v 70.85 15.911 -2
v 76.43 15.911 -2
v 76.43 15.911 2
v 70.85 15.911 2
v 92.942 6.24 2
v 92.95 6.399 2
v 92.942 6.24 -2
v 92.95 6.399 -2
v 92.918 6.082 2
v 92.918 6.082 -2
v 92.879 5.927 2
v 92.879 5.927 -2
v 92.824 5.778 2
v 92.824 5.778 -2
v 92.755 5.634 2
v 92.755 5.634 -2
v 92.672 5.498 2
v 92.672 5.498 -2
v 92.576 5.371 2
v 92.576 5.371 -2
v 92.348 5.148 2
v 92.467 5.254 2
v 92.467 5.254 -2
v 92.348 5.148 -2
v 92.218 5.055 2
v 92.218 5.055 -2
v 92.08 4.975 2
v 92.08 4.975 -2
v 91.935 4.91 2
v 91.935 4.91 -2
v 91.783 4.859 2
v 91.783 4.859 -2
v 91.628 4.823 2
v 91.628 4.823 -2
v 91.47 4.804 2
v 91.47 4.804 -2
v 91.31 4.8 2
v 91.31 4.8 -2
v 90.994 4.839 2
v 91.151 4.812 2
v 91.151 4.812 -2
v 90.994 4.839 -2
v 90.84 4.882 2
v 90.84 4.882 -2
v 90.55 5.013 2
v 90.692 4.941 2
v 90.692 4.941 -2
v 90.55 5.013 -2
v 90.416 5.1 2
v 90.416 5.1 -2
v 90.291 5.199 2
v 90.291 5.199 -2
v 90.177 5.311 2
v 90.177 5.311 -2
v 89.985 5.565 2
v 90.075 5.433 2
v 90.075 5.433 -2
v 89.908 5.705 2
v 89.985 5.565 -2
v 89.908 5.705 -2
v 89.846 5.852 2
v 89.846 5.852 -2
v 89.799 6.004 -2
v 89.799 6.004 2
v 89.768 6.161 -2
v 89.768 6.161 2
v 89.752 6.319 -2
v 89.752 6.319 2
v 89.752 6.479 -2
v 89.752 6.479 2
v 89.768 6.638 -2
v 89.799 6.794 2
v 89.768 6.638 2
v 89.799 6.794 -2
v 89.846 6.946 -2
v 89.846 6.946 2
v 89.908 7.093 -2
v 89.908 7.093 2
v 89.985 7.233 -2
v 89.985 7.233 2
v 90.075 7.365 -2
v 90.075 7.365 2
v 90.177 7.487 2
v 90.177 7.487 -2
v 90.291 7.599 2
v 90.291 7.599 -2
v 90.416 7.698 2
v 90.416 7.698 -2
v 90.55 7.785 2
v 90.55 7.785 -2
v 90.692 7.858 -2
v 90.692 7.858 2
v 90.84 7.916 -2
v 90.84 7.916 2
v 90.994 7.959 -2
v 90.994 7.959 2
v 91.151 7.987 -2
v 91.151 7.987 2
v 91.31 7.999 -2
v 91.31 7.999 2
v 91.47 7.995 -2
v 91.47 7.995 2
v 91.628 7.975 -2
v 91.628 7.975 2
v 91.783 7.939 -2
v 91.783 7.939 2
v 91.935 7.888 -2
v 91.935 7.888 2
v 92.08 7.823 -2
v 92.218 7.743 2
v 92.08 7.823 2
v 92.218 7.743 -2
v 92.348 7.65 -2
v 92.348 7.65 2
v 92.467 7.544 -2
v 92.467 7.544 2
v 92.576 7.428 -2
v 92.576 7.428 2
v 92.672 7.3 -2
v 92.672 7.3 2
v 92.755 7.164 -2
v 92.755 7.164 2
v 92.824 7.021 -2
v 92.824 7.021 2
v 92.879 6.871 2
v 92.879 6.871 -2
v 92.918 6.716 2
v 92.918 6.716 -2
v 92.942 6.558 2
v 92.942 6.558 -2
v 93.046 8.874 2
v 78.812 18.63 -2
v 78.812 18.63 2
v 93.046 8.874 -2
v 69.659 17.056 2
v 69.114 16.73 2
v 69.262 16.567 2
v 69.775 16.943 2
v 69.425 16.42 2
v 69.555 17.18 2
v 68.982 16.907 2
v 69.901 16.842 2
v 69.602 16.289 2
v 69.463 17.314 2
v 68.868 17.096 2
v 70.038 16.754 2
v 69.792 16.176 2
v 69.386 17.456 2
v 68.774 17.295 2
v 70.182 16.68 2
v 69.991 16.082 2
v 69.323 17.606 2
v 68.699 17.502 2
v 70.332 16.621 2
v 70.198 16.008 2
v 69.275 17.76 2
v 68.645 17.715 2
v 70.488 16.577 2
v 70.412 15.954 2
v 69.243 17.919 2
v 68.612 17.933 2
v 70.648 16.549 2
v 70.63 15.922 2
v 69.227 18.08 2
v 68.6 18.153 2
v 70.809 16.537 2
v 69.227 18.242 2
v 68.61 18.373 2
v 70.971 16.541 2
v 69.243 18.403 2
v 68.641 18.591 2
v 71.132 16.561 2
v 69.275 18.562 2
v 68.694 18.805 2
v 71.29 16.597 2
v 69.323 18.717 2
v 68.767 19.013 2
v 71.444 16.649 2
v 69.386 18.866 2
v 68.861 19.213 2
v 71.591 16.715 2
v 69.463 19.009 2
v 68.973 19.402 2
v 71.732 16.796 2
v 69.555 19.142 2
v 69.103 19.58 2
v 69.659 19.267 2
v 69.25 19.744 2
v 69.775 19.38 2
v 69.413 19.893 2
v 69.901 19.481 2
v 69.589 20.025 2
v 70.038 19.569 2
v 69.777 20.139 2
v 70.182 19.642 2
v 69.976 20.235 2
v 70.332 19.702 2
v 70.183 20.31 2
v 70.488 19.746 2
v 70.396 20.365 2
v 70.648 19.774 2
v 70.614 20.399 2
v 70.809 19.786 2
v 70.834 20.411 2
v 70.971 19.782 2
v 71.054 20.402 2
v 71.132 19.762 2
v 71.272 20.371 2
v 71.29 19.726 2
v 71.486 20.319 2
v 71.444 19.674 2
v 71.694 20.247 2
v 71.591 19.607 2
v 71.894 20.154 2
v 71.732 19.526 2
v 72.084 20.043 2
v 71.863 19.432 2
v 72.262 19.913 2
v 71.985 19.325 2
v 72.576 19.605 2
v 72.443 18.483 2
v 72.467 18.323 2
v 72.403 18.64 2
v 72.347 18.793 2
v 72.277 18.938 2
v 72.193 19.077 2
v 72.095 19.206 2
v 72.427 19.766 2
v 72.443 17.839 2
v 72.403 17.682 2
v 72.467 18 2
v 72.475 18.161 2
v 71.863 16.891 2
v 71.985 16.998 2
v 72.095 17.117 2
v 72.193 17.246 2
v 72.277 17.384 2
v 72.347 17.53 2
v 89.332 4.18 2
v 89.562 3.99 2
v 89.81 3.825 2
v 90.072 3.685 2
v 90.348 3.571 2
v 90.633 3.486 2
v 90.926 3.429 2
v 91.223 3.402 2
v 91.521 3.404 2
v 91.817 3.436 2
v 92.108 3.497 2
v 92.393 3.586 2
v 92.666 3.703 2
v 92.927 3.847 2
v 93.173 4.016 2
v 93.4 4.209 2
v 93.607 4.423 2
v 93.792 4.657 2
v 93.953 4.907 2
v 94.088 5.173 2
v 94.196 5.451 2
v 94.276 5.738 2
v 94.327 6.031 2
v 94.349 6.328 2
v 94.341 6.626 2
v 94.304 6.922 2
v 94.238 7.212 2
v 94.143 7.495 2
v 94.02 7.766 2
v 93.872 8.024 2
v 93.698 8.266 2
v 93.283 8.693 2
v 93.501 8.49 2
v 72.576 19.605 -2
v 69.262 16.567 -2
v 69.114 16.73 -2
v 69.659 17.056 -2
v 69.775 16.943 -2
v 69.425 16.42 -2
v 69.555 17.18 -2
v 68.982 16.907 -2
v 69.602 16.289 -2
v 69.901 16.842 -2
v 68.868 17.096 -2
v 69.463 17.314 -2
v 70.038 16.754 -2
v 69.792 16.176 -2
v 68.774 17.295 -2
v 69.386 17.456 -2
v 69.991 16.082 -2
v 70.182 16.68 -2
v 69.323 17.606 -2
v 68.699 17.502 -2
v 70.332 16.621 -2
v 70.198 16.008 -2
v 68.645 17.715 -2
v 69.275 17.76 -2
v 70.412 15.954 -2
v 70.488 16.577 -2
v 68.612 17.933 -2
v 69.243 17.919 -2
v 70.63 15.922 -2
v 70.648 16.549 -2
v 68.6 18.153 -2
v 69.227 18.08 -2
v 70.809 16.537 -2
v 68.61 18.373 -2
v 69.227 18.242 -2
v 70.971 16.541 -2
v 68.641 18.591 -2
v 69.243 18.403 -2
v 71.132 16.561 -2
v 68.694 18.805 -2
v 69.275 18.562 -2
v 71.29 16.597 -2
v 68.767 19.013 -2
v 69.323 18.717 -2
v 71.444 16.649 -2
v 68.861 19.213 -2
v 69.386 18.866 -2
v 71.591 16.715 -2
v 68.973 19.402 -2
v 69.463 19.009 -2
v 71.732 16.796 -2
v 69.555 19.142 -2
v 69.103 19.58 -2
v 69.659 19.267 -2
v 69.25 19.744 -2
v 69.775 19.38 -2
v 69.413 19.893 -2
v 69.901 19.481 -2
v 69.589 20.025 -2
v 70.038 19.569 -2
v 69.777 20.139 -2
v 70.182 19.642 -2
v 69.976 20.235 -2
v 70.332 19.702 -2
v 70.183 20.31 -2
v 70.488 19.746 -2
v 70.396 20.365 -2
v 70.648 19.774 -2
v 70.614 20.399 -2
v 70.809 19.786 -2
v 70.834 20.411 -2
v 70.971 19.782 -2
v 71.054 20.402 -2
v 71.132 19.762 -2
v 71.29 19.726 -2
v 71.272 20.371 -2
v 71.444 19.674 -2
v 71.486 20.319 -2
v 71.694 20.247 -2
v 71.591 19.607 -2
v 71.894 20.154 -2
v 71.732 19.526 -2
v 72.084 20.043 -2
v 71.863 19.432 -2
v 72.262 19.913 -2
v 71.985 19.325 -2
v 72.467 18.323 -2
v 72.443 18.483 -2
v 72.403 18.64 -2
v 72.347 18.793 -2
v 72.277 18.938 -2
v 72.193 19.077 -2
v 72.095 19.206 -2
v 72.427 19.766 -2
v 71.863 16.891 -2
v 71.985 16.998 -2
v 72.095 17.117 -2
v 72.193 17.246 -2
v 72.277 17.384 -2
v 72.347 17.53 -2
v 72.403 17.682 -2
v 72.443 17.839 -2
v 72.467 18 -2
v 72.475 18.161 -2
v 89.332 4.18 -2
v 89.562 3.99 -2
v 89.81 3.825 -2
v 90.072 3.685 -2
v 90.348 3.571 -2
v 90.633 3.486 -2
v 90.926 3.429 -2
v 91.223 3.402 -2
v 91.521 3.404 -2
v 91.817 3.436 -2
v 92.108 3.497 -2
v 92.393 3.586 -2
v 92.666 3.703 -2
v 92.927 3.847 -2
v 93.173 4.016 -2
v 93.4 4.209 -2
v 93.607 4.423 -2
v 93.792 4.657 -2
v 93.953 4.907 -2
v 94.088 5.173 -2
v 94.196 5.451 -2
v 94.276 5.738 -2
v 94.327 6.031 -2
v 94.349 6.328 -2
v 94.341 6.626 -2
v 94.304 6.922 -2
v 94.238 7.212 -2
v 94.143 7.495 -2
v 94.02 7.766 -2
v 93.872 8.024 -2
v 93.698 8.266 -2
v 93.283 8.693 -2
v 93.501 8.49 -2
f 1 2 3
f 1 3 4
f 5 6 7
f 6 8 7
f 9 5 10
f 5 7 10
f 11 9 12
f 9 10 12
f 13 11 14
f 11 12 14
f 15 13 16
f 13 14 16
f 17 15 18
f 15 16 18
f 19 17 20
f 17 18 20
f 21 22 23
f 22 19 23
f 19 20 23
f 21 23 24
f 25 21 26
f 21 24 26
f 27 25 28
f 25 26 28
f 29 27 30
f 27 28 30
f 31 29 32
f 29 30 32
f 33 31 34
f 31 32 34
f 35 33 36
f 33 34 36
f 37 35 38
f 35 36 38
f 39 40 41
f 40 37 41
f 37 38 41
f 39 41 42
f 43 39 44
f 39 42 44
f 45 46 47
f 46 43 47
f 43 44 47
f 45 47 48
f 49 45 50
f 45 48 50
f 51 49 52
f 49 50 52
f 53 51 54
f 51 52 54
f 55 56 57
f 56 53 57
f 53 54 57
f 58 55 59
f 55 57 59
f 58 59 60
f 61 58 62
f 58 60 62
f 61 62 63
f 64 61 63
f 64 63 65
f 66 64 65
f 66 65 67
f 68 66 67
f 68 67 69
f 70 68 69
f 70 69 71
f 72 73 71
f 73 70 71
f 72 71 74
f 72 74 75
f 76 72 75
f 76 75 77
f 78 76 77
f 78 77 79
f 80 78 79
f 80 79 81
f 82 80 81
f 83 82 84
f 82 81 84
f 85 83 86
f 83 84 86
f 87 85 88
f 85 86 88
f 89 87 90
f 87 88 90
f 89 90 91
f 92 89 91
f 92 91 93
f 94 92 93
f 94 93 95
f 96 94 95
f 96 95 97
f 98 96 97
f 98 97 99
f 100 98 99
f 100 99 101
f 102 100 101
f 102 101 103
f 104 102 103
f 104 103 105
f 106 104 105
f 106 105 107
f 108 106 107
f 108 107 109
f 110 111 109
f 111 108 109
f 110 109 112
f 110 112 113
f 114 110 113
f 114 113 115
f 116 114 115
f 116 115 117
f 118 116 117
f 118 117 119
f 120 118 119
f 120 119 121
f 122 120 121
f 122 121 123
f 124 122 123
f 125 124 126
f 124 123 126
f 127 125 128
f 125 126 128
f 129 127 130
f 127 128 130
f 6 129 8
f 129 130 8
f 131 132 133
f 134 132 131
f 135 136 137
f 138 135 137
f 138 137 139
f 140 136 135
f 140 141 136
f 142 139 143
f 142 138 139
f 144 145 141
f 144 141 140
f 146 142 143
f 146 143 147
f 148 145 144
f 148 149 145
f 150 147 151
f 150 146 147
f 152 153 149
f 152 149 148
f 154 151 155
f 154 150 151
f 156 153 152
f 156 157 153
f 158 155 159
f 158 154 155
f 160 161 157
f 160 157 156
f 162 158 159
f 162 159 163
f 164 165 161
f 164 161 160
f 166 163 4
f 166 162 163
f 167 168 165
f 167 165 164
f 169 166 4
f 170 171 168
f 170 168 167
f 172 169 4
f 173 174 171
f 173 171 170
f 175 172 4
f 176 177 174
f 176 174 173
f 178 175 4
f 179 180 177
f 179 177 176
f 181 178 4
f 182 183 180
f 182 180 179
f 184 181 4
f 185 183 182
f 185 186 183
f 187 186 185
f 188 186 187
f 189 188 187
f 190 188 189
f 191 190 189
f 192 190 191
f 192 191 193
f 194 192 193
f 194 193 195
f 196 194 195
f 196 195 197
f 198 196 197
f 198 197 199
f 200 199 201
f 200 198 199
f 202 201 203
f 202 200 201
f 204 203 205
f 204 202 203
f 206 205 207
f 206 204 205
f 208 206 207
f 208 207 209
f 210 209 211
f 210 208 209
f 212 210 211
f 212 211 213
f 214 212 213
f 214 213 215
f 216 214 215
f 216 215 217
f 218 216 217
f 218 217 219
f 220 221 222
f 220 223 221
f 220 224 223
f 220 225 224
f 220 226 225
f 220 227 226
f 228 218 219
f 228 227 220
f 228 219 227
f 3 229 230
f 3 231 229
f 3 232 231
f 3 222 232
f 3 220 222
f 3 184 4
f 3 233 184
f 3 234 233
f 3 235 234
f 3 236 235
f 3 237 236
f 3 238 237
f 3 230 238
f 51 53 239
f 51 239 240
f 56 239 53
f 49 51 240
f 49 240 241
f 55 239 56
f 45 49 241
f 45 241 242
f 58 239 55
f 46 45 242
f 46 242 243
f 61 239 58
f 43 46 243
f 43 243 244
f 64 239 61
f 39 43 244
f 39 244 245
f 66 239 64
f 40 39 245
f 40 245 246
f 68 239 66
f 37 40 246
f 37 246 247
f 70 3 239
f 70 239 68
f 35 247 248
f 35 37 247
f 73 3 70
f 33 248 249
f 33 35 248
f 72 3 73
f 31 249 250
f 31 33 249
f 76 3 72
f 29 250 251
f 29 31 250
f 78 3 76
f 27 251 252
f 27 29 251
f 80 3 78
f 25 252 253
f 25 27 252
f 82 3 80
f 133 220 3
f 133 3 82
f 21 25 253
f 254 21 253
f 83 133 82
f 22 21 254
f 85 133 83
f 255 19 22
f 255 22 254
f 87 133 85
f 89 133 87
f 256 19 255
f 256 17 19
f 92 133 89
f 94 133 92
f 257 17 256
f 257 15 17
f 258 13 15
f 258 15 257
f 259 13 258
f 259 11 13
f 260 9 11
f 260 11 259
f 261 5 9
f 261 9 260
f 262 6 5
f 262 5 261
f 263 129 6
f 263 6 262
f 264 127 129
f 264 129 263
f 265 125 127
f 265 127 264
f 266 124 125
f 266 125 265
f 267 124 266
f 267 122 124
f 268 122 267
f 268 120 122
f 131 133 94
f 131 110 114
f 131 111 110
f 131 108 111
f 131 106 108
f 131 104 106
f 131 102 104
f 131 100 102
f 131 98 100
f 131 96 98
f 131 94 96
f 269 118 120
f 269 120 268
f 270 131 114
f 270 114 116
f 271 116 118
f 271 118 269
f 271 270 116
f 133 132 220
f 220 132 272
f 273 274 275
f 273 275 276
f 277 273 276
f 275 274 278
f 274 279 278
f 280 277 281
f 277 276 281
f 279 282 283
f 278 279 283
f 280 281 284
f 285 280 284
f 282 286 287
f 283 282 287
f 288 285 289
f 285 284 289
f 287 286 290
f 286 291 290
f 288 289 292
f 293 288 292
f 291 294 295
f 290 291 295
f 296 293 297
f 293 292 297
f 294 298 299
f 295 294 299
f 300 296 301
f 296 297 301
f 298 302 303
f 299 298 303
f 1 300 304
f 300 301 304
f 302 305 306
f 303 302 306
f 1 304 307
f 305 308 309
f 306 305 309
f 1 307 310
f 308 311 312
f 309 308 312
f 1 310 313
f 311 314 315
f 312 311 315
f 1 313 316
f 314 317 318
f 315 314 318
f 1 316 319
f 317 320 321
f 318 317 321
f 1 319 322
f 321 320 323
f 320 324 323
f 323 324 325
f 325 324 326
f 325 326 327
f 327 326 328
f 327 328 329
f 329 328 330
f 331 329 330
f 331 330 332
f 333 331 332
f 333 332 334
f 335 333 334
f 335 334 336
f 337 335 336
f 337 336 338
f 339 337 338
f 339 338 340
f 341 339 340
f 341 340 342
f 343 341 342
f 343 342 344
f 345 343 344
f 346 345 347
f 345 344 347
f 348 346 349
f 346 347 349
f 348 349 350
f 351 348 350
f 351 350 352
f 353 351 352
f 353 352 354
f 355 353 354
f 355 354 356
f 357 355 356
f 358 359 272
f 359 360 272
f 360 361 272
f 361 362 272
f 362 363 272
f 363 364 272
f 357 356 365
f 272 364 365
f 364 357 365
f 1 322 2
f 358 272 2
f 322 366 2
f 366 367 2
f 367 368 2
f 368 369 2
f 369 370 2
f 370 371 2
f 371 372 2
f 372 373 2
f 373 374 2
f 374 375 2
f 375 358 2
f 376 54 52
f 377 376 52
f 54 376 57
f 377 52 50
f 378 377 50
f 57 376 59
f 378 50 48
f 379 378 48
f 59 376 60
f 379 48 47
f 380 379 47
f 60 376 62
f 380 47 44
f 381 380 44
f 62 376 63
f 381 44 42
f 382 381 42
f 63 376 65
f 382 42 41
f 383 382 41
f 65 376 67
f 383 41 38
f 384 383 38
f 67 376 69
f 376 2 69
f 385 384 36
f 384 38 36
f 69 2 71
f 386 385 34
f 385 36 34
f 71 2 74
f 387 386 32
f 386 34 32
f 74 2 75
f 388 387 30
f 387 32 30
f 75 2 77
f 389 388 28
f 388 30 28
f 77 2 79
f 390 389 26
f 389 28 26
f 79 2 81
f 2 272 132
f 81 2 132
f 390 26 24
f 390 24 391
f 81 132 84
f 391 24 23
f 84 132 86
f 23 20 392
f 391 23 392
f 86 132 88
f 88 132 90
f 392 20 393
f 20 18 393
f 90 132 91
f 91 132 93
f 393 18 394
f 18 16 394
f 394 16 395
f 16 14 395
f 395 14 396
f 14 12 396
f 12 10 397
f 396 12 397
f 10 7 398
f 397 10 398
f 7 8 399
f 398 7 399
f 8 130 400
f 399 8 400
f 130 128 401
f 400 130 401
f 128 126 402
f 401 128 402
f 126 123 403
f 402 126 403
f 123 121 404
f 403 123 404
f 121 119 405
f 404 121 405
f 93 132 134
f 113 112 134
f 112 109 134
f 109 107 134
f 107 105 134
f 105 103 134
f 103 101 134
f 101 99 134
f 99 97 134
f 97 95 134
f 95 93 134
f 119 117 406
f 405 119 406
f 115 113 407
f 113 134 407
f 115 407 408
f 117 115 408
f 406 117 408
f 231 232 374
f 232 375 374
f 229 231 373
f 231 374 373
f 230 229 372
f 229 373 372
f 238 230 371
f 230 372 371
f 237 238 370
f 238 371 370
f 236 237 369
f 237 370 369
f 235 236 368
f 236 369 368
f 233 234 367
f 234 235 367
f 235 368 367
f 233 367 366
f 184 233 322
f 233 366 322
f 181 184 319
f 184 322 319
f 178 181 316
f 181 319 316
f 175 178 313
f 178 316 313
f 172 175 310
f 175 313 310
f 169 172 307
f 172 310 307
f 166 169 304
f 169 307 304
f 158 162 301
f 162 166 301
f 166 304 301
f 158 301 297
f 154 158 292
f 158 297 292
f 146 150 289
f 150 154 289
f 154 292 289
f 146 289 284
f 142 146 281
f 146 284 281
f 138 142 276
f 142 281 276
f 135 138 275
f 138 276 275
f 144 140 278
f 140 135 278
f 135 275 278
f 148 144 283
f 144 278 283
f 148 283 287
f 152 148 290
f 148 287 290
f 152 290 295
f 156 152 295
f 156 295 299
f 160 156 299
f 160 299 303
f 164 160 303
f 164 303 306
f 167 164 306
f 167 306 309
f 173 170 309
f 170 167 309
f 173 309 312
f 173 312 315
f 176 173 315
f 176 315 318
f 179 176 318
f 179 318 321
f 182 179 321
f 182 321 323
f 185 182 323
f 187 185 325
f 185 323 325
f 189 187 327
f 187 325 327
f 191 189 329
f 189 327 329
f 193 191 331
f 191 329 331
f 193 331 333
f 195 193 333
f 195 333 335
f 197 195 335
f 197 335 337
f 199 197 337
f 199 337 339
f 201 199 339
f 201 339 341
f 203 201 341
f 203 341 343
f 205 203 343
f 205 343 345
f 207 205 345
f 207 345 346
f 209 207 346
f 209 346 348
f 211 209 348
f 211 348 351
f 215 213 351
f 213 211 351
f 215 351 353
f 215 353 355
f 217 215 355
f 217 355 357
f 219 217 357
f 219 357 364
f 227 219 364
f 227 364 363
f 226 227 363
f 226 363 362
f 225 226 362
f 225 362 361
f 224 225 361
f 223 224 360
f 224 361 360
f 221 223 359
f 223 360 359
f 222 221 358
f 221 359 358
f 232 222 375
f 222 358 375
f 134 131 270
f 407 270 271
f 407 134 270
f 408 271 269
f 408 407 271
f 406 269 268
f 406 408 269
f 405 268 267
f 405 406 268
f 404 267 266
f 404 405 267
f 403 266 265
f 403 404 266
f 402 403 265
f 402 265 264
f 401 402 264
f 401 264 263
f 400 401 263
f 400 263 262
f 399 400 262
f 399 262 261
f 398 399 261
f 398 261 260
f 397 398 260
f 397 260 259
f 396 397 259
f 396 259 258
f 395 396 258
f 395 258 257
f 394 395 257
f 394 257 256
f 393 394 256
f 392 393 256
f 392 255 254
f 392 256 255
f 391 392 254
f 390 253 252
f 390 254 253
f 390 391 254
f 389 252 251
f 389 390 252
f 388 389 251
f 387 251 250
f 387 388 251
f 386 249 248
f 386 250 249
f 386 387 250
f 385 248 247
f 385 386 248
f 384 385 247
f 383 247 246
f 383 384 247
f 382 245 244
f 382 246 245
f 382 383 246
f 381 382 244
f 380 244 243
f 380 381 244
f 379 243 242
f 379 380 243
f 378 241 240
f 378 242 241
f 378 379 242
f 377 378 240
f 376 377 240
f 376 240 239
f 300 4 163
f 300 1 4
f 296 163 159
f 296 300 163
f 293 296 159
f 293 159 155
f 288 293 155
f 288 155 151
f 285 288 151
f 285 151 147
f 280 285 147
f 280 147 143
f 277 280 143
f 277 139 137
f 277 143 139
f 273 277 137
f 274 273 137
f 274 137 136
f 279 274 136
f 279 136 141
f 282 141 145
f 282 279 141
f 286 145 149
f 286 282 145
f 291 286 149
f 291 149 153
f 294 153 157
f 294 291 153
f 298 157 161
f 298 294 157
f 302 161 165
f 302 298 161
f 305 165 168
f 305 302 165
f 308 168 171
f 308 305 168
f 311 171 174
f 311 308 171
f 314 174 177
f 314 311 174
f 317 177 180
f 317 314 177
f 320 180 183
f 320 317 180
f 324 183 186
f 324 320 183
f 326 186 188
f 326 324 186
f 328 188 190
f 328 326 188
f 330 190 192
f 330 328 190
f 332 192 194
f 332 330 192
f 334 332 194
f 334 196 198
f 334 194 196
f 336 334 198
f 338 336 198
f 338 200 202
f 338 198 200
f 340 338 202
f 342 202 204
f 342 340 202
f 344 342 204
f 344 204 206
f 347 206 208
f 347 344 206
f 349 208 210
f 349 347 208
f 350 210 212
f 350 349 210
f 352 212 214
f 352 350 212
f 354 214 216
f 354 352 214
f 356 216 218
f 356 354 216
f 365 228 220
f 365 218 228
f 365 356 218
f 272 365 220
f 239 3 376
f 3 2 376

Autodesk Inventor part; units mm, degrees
ref_plane "YZ Plane" through (0, 0, 0) normal (1, 0, 0) x (0, 1, 0)
ref_plane "XZ Plane" through (0, 0, 0) normal (0, 1, 0) x (-1, 0, 0)
ref_plane "XY Plane" through (0, 0, 0) normal (0, 0, 1) x (1, 0, 0)
sketch "Sketch1" plane through (0, 0, 0) normal (0, 0, 1) x (1, 0, 0)
  circle A0 centre (91.35, 6.3991) radius 1.6 projected
  circle A1 centre (70.85, 18.1613) radius 2.25
  circle A2 centre (91.35, 6.3991) radius 3
  line L0 (76.4305, 15.9113) -> (89.3317, 4.1796)
  line L1 (78.8117, 18.6299) -> (93.0461, 8.8737)
  circle A3 centre (70.85, 13.6613) radius 1.6 projected
  circle A4 centre (70.85, 18.1613) radius 1.625 projected
  line L2 (76.4305, 15.9113) -> (70.85, 15.9113)
  line L3 (78.8117, 18.6299) -> (72.5761, 19.6046)
  point P0 (0, 0)
  point P1 (72.1824, 12.7754)
  point P2 (69.5176, 12.7754)
  dimension "d0" = 4.5
  dimension "d1" = 6
extrude "Extrusion1" add sketch "Sketch1" along normal mid plane 4 contours A1 | A1 L3 L1 A2 L0 L2 | A2
properties part number "Palanca metacarpo_distal"
